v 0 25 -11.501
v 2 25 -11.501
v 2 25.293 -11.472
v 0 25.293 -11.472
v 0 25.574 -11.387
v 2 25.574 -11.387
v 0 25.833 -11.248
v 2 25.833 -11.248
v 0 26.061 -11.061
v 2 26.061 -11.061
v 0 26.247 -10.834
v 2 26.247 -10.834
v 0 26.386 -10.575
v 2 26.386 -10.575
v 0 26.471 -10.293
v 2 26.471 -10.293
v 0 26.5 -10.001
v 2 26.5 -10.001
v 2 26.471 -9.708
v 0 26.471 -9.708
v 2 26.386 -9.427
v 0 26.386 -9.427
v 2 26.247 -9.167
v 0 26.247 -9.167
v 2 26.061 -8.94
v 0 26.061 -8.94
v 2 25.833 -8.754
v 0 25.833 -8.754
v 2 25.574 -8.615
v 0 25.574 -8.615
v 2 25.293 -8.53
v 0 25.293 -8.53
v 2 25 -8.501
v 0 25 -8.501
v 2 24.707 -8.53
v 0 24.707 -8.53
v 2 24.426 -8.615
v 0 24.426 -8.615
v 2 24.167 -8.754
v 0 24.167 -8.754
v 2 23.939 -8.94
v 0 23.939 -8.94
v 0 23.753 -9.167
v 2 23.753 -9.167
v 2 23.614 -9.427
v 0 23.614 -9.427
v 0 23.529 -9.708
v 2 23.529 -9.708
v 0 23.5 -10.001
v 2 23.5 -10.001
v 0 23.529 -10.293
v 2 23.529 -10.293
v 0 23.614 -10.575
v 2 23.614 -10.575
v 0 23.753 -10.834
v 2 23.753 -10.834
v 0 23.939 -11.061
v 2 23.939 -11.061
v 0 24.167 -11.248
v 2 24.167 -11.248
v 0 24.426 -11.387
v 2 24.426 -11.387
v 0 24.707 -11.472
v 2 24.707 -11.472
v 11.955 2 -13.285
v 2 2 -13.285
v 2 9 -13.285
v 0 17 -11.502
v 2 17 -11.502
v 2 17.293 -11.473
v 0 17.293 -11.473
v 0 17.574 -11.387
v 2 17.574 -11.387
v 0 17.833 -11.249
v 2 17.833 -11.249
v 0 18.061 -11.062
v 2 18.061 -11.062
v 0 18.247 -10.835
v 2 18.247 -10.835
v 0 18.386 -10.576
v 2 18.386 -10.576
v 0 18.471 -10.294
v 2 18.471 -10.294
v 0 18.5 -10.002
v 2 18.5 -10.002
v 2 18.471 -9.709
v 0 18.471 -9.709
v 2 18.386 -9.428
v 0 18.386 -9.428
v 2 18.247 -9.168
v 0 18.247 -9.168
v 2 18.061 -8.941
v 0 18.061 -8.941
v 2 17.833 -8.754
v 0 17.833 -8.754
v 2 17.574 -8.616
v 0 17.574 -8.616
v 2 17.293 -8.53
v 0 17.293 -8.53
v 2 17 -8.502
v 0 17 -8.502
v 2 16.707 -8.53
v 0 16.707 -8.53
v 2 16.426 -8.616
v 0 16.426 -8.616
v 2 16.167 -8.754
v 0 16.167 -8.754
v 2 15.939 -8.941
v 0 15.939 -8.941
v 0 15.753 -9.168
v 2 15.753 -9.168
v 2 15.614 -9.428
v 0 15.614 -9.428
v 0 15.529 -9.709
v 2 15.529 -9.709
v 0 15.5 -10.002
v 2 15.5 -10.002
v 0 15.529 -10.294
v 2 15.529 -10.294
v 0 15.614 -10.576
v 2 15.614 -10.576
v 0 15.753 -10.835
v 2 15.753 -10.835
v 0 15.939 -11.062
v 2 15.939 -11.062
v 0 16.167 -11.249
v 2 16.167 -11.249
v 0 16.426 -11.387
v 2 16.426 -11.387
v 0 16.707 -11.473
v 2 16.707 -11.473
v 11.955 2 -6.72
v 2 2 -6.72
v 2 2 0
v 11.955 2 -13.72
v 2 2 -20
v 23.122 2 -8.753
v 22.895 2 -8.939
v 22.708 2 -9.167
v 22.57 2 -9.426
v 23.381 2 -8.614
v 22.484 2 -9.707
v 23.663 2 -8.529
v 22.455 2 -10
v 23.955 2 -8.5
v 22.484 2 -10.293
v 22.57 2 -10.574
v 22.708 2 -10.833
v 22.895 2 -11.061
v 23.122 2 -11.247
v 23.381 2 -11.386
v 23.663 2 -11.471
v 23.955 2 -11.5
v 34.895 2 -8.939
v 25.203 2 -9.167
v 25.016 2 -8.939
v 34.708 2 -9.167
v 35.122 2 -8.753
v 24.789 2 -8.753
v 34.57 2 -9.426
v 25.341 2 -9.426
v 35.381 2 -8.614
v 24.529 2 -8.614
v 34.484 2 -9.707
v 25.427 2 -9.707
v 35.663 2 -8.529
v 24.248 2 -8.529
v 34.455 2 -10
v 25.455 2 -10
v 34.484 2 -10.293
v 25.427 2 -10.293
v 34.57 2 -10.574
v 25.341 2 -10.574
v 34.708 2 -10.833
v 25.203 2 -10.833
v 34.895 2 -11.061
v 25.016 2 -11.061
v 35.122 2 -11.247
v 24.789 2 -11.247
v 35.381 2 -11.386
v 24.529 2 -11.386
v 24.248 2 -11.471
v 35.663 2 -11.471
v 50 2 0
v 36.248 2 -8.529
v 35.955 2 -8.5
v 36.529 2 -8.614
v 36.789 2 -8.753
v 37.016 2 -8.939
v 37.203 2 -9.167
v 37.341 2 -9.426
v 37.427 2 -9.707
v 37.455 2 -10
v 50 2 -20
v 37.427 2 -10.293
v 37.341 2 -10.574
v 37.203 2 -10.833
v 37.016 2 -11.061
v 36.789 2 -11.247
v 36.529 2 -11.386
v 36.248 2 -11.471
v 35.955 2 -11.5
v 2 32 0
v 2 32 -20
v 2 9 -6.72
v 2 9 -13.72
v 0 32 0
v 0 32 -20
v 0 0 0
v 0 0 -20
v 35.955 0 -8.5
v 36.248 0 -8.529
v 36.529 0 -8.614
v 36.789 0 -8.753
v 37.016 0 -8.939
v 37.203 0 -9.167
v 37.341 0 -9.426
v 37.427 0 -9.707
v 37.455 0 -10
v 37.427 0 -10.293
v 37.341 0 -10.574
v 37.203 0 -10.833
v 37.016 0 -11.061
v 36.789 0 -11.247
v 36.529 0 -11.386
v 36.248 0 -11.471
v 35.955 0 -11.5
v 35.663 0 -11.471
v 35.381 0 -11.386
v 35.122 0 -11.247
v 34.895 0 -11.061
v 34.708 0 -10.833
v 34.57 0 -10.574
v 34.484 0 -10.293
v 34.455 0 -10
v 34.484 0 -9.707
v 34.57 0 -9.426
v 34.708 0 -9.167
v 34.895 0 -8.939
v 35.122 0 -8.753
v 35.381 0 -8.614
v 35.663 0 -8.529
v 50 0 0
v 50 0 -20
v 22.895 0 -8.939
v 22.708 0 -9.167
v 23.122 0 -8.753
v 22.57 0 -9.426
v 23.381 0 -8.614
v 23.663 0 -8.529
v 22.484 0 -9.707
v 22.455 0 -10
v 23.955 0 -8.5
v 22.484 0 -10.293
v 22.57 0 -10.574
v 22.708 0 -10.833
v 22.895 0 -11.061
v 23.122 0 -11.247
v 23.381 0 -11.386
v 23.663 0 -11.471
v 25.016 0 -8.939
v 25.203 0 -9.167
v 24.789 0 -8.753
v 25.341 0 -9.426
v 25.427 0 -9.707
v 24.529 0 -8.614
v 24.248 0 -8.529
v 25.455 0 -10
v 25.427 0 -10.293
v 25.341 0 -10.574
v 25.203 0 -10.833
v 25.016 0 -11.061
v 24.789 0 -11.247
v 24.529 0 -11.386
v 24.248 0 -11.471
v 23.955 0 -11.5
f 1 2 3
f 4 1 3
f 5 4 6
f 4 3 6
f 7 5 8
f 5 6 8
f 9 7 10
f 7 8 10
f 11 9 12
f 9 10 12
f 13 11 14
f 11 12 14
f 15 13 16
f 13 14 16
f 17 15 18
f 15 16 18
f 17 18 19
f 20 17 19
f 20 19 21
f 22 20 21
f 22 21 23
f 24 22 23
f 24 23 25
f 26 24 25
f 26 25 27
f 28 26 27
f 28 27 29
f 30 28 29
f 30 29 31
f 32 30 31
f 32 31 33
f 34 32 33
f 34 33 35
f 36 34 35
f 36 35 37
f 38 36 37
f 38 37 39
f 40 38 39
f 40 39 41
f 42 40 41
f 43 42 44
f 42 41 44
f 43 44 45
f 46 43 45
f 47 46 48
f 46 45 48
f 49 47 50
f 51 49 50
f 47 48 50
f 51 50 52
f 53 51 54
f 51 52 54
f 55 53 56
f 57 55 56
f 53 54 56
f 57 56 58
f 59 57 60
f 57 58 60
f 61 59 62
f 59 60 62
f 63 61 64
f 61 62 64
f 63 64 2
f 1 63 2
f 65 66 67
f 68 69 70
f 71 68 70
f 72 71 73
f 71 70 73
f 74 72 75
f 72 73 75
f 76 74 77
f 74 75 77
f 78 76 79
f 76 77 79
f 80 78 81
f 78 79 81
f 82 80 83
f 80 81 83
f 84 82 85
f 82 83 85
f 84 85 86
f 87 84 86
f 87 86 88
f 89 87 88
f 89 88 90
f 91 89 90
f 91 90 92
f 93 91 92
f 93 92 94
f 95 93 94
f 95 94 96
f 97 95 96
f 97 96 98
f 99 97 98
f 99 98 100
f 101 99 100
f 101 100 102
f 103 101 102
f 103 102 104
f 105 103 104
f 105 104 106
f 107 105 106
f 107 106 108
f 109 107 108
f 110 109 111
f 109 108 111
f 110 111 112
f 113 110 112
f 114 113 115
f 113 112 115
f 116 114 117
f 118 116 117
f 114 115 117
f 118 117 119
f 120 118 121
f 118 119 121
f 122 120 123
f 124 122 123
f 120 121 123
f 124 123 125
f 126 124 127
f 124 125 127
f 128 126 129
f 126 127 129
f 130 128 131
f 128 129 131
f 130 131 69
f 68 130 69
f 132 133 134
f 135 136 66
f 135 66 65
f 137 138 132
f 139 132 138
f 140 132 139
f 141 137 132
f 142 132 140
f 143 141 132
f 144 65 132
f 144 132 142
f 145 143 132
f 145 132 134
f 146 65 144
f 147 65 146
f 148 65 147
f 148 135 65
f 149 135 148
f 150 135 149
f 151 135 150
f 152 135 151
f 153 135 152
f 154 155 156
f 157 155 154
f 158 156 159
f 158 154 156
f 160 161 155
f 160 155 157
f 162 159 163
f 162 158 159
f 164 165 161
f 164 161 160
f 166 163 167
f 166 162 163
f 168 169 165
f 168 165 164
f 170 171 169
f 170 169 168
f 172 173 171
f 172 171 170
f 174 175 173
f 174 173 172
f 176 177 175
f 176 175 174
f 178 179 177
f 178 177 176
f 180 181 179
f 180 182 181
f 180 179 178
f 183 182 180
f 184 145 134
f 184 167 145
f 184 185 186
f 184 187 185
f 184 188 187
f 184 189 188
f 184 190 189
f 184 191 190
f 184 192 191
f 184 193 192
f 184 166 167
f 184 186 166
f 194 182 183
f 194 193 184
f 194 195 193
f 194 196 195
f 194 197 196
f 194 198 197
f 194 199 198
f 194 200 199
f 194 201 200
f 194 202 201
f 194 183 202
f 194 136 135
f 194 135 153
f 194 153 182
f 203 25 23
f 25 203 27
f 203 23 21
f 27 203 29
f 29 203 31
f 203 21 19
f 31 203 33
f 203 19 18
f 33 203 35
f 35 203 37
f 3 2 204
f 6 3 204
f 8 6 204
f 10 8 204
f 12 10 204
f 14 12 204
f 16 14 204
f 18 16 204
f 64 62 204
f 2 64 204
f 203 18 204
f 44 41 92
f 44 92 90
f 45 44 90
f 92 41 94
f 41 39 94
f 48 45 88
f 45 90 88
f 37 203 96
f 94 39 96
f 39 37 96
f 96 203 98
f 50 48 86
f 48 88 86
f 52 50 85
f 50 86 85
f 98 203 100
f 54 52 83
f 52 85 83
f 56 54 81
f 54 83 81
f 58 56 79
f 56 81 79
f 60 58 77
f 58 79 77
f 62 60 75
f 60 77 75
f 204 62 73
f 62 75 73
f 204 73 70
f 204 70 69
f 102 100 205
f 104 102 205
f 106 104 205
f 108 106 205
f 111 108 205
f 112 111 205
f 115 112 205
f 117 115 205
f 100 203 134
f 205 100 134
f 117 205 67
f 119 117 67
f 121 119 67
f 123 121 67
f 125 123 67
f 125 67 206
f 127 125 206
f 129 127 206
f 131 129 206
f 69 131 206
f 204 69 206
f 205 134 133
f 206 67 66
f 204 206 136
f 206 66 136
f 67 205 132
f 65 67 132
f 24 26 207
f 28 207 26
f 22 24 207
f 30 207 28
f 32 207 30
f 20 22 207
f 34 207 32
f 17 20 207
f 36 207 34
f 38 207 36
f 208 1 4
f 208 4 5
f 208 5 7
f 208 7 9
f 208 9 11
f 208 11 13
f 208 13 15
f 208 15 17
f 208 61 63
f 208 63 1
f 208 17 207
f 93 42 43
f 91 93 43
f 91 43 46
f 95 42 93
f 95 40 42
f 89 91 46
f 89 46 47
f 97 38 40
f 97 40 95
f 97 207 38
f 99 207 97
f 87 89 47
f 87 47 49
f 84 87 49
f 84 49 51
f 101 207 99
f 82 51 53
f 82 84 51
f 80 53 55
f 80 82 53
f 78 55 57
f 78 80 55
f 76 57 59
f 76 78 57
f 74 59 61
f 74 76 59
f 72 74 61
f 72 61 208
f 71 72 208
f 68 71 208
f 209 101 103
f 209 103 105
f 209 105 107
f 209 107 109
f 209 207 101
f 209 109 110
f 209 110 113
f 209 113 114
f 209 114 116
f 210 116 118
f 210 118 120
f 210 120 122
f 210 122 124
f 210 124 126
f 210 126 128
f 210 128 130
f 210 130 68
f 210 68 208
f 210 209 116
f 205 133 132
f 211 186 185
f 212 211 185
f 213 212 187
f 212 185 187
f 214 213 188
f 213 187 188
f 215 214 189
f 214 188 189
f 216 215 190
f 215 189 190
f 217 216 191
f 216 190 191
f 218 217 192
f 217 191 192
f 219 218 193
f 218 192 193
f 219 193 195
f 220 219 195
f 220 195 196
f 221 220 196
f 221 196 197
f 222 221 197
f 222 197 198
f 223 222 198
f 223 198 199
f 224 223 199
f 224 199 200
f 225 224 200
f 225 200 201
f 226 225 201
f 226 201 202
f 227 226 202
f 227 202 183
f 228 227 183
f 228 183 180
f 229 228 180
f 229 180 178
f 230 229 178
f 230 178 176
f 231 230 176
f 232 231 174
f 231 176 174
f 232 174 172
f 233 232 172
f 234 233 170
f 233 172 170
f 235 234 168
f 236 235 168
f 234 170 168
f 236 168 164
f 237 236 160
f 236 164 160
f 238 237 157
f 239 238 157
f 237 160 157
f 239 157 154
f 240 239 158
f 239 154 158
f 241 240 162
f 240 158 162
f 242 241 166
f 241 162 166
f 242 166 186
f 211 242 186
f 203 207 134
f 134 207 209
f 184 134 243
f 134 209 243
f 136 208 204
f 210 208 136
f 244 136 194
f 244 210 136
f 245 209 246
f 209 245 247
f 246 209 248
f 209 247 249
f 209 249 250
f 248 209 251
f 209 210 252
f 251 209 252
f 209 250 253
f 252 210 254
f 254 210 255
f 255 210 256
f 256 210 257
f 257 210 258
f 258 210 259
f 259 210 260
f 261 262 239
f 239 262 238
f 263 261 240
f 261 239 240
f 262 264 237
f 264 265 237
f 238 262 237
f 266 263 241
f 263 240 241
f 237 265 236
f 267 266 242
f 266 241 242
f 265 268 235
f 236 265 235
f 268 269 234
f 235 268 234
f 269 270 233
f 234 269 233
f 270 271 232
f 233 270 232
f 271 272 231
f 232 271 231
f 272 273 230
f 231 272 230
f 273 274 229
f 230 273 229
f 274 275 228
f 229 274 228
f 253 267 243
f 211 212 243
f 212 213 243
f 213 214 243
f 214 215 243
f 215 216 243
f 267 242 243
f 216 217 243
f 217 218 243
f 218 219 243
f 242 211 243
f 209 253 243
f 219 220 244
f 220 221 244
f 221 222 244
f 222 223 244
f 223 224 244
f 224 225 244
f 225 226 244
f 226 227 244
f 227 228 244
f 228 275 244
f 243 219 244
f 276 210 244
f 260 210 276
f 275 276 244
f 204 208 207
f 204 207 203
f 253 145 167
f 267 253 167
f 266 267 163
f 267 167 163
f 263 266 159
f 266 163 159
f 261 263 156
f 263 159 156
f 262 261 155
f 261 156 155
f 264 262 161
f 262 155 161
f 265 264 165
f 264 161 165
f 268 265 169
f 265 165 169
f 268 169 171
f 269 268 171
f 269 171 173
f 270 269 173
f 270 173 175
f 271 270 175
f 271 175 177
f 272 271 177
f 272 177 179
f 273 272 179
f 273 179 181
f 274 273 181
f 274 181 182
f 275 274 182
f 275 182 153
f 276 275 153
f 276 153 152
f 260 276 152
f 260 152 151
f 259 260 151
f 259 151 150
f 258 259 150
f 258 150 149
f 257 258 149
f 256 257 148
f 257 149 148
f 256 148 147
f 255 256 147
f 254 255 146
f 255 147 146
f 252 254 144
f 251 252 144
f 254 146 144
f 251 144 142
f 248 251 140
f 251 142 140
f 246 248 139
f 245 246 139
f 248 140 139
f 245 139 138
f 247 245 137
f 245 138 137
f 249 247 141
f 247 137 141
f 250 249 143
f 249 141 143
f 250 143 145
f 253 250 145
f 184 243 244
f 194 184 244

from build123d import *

# Parameters (mm, degrees)
SKETCH1_W           = 50
SKETCH1_H           = 20
BOSS_EXTRUDE1_DEPTH = 2
SKETCH2_W           = 2
SKETCH2_H           = 20
BOSS_EXTRUDE2_DEPTH = 30
SKETCH4_W           = 9.955385113
SKETCH4_H           = 6.56478527
BOSS_EXTRUDE3_DEPTH = 7
CUT_EXTRUDE1_DEPTH  = 7
SKETCH6_R           = 1.5
CUT_EXTRUDE2_DEPTH  = 7
SKETCH7_R           = 1.5
CUT_EXTRUDE3_DEPTH  = 7


with BuildPart() as part:
    # Sketch1 → Boss-Extrude1 (new body)
    with BuildSketch(Plane(origin=(0, 0, 0), x_dir=(1, 0, 0), z_dir=(0, 1, 0))):
        with Locations((25, 10)):
            Rectangle(SKETCH1_W, SKETCH1_H)
    extrude(amount=BOSS_EXTRUDE1_DEPTH)

    # Sketch2 → Boss-Extrude2 (add)
    with BuildSketch(Plane(origin=(0, 2, 0), x_dir=(1, 0, 0), z_dir=(0, 1, 0))):
        with Locations((1, 10)):
            Rectangle(SKETCH2_W, SKETCH2_H)
    extrude(amount=BOSS_EXTRUDE2_DEPTH)

    # Sketch4 → Boss-Extrude3 (add)
    with BuildSketch(Plane(origin=(0, 2, 0), x_dir=(1, 0, 0), z_dir=(0, 1, 0))):
        with Locations((6.977692557, 10.002392635)):
            Rectangle(SKETCH4_W, SKETCH4_H)
    extrude(amount=BOSS_EXTRUDE3_DEPTH)

    # Sketch5 → Cut-Extrude1 (cut)
    with BuildSketch(Plane.XY.offset(-6.72)):
        Polygon((2, 9), (11.955385113, 2), (11.955385113, 9), align=None)
    extrude(amount=-CUT_EXTRUDE1_DEPTH, mode=Mode.SUBTRACT)

    # Sketch6 → Cut-Extrude2 (cut)
    with BuildSketch(Plane(origin=(0, 2, 0), x_dir=(1, 0, 0), z_dir=(0, 1, 0))):
        with Locations(Location((23.955385113, 10, 0), (0, 0, 270))):
            Circle(SKETCH6_R)
        with Locations(Location((35.955385113, 10, 0), (0, 0, 270))):
            Circle(SKETCH6_R)
    extrude(amount=-CUT_EXTRUDE2_DEPTH, mode=Mode.SUBTRACT)

    # Sketch7 → Cut-Extrude3 (cut)
    with BuildSketch(Plane(origin=(2, 0, 0), x_dir=(0, 0, -1), z_dir=(1, 0, 0))):
        with Locations((10.001560414, 17)):
            Circle(SKETCH7_R)
        with Locations((10.000728193, 24.999999957)):
            Circle(SKETCH7_R)
    extrude(amount=-CUT_EXTRUDE3_DEPTH, mode=Mode.SUBTRACT)


solid = part.part
